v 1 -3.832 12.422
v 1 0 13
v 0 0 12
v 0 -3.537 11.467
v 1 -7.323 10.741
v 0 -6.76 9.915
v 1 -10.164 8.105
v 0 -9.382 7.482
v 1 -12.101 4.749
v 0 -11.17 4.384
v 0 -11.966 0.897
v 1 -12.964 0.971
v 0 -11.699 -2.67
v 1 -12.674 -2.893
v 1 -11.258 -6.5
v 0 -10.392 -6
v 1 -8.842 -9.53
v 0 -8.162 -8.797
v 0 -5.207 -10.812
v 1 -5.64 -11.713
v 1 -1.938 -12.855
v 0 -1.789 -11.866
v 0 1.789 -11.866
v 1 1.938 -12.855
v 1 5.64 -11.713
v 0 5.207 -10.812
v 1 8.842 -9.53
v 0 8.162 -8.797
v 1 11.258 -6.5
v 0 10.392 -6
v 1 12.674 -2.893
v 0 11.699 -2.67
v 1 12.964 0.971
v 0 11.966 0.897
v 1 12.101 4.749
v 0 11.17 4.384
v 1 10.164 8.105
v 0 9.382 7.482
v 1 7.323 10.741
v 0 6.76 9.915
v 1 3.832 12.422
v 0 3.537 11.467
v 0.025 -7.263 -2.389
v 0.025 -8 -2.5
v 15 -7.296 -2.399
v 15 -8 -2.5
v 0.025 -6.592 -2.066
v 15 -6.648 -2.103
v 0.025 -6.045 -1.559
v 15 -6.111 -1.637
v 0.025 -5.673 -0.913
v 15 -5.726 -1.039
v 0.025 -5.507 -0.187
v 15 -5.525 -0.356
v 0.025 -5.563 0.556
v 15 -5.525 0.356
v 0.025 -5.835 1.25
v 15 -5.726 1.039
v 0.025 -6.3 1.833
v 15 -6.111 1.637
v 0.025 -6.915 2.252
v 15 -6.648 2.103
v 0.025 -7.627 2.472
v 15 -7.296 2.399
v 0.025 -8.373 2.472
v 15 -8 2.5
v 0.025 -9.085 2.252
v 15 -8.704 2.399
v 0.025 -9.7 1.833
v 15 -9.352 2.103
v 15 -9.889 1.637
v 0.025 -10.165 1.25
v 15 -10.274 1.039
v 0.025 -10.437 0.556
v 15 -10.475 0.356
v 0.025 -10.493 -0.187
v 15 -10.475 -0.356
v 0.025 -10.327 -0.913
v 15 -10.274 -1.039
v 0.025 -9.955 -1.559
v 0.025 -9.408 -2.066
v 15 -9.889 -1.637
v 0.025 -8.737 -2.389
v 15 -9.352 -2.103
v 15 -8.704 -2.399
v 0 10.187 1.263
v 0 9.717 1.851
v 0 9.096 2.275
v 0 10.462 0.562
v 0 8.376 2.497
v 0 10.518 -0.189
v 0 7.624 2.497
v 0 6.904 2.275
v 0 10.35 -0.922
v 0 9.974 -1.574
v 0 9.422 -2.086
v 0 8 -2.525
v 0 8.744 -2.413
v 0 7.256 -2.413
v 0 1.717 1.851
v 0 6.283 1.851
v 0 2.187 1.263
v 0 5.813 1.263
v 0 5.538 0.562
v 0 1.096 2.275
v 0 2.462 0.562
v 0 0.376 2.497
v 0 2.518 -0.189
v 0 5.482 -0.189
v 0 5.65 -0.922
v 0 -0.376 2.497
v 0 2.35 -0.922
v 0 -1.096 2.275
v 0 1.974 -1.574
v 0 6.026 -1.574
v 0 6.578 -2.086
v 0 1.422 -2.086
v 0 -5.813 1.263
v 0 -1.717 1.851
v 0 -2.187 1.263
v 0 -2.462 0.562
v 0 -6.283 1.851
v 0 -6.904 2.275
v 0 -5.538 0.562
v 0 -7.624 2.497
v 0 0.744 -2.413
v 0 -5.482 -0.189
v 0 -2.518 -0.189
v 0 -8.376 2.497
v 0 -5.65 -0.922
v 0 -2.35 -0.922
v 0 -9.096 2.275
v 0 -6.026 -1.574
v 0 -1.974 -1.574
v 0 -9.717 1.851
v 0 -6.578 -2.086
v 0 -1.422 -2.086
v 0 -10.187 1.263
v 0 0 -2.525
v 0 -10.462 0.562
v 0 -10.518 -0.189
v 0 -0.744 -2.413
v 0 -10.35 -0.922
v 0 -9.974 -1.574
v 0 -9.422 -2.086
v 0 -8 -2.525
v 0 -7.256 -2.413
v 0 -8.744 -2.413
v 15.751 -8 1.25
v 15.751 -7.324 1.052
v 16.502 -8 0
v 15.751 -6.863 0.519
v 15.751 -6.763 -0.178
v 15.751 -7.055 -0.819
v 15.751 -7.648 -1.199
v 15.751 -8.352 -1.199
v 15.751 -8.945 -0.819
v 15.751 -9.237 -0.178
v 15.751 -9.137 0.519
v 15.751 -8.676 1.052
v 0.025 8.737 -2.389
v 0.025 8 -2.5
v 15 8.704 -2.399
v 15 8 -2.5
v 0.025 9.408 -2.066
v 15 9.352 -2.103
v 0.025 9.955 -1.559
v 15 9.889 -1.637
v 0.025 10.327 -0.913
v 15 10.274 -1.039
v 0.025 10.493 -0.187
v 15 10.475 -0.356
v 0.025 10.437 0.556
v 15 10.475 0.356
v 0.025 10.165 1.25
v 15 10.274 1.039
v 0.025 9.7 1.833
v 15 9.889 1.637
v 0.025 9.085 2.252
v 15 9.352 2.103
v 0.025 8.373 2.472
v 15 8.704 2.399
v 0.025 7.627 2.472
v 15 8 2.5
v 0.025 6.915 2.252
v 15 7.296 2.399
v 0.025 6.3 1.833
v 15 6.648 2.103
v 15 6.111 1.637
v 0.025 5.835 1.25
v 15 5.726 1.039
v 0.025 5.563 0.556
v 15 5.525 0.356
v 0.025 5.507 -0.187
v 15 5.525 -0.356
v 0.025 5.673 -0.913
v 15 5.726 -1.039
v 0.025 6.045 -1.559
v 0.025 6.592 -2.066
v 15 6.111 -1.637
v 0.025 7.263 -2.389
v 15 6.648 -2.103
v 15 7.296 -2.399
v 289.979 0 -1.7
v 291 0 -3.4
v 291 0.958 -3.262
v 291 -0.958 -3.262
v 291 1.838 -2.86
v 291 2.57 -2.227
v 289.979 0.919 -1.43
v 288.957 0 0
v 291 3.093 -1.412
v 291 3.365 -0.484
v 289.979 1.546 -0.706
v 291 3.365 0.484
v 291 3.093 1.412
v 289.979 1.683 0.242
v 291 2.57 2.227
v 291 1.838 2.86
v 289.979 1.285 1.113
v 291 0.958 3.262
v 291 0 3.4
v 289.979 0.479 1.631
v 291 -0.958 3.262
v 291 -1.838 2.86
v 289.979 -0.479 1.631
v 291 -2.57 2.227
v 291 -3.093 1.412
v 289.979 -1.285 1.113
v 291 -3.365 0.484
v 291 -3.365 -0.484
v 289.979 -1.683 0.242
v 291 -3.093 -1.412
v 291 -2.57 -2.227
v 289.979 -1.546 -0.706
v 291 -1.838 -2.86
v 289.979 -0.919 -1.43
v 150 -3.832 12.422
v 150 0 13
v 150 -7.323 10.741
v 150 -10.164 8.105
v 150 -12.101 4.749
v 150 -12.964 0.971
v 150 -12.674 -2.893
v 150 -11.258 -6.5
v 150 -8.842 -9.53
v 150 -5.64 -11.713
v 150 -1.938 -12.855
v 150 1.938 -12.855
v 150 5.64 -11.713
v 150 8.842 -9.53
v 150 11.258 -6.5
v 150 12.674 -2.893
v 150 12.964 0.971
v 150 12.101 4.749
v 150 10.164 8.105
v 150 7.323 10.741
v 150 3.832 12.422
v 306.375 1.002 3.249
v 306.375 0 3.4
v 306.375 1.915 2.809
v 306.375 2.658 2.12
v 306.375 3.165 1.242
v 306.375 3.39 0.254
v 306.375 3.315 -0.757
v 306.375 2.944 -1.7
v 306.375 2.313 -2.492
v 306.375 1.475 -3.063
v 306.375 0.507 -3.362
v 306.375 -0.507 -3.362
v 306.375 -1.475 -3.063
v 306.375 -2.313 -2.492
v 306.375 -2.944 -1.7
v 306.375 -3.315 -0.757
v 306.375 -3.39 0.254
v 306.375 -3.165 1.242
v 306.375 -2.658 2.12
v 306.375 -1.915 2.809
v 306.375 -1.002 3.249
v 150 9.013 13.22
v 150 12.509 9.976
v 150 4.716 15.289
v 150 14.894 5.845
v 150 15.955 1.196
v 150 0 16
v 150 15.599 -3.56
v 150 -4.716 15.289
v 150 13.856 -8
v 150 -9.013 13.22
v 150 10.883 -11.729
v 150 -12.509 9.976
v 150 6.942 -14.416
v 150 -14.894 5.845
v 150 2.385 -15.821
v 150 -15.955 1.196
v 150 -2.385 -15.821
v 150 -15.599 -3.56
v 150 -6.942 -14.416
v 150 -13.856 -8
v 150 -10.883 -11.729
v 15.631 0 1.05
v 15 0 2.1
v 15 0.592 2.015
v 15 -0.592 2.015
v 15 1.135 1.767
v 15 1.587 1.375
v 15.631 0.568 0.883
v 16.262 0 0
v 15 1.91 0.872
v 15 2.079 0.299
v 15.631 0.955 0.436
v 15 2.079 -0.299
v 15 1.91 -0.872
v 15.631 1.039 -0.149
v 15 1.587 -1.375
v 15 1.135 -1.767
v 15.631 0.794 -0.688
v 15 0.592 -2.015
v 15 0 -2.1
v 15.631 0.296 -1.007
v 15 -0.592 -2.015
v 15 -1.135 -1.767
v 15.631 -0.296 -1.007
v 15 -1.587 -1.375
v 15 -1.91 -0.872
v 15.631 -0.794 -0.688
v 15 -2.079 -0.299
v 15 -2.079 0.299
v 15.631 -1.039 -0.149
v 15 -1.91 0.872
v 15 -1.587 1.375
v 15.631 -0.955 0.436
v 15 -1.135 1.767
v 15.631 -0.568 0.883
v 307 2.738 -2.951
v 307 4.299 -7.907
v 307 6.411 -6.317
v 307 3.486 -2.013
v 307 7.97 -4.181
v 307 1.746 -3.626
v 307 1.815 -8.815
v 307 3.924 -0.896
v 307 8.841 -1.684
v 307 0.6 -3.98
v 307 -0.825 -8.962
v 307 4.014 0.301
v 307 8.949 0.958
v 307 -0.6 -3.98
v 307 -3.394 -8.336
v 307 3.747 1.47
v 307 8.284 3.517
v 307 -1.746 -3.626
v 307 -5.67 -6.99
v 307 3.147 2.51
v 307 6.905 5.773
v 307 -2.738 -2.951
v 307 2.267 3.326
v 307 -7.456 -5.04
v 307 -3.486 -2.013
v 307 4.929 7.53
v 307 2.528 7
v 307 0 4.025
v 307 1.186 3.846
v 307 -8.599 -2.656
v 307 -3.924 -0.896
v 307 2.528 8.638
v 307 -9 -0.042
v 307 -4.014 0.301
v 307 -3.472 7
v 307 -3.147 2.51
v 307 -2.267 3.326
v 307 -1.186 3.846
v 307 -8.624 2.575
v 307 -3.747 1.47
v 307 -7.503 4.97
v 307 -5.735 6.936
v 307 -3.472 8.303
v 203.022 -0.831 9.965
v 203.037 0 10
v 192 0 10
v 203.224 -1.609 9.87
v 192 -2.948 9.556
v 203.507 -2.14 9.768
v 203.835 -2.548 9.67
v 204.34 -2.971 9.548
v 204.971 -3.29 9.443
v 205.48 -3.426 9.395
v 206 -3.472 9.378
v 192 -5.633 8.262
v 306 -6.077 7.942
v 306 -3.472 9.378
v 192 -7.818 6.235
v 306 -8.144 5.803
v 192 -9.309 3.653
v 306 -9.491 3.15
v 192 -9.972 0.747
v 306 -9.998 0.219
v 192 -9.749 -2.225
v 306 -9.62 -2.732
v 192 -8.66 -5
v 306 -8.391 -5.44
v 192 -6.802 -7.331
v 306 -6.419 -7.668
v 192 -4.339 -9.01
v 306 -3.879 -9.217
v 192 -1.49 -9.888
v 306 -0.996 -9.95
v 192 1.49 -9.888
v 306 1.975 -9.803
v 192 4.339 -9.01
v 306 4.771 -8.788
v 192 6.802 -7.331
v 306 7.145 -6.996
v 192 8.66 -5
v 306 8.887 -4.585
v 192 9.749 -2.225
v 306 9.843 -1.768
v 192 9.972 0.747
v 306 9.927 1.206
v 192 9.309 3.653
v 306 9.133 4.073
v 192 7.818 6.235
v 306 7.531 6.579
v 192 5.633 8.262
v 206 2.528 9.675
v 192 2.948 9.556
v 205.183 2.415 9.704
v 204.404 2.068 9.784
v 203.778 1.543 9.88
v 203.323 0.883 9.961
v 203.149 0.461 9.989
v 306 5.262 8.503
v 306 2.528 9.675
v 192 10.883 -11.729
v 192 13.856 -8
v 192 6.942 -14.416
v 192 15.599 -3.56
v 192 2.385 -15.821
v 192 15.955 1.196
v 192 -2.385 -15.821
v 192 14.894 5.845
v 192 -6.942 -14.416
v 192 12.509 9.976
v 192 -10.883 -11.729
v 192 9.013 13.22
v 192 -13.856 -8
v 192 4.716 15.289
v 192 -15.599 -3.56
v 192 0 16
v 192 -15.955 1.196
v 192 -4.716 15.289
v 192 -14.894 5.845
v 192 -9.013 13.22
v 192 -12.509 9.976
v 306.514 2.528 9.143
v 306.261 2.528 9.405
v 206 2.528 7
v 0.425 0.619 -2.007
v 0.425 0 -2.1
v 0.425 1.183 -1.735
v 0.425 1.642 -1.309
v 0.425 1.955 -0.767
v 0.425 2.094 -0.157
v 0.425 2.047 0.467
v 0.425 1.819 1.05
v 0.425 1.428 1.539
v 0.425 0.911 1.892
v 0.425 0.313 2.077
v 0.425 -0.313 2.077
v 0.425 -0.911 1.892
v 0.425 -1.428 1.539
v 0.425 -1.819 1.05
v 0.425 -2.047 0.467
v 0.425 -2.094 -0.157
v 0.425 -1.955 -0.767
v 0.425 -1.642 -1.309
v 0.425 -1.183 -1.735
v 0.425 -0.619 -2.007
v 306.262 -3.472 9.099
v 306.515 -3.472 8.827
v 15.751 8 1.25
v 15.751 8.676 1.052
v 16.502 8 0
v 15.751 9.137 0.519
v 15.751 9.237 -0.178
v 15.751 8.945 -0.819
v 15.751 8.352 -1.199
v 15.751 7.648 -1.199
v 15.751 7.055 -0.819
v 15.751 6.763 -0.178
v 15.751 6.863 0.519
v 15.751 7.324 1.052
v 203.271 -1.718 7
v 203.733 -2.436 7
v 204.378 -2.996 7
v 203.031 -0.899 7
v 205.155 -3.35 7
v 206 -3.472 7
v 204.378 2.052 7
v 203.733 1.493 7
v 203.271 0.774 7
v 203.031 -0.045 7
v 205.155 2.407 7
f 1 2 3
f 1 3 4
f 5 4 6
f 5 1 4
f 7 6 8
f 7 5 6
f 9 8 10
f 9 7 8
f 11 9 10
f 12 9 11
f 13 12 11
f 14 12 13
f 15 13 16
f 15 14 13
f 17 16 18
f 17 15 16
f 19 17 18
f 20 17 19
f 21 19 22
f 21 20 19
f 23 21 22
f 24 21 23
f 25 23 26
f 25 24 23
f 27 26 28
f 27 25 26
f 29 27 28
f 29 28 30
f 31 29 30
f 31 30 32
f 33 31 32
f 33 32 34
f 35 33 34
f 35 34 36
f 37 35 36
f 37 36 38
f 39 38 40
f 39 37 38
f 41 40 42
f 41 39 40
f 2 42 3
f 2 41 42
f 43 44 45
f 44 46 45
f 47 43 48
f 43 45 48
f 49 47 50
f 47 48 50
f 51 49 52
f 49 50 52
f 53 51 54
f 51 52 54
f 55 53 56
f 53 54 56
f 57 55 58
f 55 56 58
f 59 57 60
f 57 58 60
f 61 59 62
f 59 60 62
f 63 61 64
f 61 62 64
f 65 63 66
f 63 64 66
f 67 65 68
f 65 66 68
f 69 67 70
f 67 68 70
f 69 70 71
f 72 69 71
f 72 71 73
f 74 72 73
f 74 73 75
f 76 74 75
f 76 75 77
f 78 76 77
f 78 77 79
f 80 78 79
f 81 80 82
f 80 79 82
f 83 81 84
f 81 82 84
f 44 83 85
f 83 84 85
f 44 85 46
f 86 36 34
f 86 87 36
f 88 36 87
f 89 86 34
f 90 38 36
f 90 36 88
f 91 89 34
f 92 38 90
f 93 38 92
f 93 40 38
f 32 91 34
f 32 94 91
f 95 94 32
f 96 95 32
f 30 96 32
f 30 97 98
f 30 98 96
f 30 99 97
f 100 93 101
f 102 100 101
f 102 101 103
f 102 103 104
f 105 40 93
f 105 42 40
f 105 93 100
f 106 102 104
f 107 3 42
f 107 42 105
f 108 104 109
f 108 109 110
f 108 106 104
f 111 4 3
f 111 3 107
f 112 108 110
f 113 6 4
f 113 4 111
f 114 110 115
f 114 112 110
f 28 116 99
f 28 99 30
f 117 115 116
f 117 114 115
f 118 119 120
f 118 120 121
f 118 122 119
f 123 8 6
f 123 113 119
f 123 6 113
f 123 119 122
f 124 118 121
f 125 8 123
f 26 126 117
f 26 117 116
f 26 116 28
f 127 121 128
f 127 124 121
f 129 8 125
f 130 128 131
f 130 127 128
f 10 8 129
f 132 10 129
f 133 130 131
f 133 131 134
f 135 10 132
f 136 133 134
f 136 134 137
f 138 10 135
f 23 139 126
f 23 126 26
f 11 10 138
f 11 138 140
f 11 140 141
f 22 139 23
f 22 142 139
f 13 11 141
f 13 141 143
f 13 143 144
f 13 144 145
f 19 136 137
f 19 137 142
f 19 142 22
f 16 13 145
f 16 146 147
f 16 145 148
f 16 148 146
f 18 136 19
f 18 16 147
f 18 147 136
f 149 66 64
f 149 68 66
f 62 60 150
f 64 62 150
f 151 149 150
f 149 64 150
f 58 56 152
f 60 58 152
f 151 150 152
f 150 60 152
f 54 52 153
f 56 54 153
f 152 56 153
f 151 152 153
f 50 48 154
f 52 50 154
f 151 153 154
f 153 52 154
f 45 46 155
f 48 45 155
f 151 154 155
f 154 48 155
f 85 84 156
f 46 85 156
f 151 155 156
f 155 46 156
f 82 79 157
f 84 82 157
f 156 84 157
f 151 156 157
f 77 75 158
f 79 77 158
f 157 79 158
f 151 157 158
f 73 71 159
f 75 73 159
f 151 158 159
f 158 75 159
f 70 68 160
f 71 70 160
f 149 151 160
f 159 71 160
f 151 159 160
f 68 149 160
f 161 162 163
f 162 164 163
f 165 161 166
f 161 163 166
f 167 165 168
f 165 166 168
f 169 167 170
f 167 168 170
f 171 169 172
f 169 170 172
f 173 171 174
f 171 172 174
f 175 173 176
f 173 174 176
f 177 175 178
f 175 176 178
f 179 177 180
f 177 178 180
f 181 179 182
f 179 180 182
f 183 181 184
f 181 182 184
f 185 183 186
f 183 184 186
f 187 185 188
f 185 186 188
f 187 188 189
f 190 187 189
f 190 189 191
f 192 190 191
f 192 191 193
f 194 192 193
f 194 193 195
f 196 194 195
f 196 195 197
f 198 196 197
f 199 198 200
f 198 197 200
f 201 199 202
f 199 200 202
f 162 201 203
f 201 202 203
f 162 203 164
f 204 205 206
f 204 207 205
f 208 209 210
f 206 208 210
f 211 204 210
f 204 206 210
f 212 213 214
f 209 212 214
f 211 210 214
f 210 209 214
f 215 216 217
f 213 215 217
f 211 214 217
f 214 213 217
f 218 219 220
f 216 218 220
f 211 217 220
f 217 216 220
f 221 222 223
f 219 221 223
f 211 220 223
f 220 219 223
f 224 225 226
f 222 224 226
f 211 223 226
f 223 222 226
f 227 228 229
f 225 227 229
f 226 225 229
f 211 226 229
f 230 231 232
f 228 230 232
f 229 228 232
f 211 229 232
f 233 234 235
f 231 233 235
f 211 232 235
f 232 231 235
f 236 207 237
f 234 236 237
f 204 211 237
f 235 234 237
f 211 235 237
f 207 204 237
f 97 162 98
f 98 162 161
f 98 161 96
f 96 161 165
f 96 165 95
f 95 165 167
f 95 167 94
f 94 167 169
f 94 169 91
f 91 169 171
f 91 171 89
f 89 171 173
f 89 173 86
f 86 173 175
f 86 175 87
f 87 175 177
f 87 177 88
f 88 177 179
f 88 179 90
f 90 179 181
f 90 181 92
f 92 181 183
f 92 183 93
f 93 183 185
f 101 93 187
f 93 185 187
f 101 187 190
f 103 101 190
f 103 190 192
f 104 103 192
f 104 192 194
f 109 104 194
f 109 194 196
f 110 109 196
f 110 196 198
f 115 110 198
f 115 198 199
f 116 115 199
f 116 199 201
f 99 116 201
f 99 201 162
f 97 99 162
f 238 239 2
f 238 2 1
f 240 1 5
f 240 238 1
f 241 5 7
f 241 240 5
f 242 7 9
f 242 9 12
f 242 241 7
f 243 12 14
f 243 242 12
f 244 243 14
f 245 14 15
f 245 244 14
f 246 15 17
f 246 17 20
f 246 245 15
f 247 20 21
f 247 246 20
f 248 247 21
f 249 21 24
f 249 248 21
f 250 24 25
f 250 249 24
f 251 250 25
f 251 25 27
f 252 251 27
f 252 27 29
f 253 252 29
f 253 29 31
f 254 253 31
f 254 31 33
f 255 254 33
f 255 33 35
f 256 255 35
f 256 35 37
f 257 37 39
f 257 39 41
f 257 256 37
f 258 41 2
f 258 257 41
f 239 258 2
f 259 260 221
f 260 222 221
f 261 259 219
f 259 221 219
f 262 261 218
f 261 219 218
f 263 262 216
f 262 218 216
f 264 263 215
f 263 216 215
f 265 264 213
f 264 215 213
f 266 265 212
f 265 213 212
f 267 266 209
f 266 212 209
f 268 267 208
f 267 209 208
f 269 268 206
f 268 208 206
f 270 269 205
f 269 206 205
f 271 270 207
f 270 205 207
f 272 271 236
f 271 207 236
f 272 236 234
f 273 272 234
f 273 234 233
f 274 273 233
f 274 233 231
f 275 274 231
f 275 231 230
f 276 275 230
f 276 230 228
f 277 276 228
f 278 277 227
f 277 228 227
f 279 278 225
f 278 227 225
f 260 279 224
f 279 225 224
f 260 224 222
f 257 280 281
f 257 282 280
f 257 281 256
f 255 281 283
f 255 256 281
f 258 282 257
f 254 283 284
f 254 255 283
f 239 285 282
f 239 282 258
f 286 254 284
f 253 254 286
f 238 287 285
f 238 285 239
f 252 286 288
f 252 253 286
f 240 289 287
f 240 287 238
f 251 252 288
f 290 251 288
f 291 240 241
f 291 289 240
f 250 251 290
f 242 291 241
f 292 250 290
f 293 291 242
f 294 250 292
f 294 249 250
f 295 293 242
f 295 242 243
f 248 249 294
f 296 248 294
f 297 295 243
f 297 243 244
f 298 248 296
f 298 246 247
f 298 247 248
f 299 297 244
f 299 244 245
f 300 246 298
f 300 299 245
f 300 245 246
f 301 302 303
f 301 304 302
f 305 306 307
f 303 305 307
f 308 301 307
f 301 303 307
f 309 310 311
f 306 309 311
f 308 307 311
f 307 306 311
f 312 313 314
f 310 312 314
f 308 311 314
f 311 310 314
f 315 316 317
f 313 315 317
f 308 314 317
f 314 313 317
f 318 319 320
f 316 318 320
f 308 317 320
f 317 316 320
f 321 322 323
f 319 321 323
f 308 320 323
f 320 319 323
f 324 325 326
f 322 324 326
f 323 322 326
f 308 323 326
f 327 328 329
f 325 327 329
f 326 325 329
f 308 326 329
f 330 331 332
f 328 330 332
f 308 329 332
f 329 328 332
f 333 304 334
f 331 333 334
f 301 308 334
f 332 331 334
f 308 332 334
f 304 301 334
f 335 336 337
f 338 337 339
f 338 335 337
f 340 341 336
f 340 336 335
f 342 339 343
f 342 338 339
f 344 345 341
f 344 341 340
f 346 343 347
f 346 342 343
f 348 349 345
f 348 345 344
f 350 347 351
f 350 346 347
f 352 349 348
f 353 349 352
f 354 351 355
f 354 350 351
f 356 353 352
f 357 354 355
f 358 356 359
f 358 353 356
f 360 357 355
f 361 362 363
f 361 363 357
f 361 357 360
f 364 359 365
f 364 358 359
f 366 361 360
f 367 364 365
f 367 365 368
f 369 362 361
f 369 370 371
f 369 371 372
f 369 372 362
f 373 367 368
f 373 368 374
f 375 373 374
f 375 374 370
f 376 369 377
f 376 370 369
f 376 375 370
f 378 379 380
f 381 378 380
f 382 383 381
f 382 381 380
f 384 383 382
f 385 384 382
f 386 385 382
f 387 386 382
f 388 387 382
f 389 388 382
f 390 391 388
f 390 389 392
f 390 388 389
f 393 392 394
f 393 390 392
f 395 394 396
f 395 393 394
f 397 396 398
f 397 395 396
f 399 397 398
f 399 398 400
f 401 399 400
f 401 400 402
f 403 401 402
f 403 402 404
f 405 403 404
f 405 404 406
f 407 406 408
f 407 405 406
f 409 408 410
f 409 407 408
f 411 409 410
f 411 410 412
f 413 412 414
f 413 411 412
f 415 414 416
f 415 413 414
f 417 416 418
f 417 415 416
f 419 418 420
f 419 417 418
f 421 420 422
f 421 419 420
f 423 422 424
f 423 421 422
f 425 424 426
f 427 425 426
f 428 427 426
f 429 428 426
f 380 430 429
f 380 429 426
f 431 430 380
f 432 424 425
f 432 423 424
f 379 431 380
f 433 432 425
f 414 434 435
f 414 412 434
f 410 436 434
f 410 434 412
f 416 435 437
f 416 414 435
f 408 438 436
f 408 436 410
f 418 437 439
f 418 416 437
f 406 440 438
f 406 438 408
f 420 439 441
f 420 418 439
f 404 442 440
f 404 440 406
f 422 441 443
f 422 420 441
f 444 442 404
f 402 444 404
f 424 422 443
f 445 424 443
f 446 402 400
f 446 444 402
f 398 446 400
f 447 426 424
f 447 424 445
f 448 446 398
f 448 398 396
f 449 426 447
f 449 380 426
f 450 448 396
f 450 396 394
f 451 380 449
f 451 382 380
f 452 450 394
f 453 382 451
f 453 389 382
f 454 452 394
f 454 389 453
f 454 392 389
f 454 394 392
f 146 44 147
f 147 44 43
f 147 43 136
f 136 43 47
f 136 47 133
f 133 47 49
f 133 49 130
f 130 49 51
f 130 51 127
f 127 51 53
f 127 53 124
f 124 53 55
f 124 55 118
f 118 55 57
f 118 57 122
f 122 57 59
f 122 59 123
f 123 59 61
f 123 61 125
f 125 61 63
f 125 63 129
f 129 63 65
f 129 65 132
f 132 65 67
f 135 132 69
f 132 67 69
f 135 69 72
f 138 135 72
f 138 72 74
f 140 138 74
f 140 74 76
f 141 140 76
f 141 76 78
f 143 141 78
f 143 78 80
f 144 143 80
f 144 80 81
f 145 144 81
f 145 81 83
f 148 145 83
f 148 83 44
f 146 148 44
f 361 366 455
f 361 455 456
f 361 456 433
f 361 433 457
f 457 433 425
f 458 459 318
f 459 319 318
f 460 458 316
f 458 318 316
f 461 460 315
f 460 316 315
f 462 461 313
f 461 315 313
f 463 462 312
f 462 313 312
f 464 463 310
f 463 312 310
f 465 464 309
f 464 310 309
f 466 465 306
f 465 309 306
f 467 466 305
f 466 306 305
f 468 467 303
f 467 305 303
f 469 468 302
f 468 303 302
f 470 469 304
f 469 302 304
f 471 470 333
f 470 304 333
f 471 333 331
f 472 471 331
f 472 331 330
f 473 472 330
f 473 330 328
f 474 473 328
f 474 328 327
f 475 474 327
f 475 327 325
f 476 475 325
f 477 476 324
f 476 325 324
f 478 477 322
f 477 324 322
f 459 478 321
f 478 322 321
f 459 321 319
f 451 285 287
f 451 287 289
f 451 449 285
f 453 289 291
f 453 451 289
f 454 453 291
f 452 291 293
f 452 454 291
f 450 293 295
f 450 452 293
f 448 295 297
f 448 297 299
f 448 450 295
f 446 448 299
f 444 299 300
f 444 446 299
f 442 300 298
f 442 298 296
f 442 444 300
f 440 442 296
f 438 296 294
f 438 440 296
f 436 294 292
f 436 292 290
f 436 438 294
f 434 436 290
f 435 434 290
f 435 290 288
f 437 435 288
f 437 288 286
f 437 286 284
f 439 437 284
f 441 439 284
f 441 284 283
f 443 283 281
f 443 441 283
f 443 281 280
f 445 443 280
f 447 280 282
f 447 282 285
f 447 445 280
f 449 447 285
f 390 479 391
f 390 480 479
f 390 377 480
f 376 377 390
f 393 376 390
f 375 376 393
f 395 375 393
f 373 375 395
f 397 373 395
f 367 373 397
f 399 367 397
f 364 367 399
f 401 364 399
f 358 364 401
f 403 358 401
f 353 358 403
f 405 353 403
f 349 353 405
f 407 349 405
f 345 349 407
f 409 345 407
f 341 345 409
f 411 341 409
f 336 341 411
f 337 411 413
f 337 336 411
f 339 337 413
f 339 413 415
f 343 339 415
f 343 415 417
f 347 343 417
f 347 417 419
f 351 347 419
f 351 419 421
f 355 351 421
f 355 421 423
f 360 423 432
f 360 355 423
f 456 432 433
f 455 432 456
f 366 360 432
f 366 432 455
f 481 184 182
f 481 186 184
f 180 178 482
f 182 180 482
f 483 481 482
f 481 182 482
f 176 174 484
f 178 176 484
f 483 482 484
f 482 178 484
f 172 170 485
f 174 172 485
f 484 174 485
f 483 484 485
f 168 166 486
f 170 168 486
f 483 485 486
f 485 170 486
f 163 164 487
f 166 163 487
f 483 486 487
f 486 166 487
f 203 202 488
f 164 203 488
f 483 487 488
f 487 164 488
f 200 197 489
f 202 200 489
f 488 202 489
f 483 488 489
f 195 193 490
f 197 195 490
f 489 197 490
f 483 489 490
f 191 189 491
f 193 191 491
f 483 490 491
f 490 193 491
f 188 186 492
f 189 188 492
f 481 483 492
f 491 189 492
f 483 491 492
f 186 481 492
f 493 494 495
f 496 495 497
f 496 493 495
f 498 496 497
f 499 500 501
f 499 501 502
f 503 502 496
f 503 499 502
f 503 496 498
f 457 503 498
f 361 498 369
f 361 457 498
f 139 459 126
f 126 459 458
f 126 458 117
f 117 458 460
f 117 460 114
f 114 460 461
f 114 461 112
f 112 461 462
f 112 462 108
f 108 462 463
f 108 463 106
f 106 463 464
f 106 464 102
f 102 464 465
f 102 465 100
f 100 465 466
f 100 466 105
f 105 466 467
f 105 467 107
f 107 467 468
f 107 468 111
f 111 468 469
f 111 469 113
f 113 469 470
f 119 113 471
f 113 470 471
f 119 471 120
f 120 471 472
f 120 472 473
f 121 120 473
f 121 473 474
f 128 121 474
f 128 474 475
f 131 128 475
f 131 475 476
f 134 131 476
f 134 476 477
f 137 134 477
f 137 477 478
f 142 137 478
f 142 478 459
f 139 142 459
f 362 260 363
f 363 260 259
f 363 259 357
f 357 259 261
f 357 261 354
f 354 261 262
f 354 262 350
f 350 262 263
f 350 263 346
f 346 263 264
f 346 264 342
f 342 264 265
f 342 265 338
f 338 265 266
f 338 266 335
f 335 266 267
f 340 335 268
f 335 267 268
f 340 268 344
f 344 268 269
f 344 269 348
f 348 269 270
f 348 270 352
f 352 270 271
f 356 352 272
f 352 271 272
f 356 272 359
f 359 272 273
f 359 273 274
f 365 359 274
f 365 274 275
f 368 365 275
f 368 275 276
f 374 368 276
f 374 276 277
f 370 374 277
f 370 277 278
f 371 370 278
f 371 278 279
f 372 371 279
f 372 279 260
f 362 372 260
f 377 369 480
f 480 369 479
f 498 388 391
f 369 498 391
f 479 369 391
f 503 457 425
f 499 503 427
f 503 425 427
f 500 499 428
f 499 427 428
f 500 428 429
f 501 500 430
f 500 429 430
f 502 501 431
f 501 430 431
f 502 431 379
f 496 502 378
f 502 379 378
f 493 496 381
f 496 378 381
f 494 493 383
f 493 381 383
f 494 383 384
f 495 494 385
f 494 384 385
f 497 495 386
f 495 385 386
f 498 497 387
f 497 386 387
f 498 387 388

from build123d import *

# Parameters (mm, degrees)
F_5_0MM_DOWEL_HOLE1_D           = 5
F_5_0MM_DOWEL_HOLE1_DEPTH       = 15
F_5_0MM_DOWEL_HOLE1_CSINK_D     = 5.05
F_5_0MM_DOWEL_HOLE1_CSINK_ANGLE = 90
F_5_0MM_DOWEL_HOLE1_TIP         = 1.502151548
M5_TAPPED_HOLE1_D               = 4.2
M5_TAPPED_HOLE1_DEPTH           = 15
M5_TAPPED_HOLE1_CSINK_D         = 5.05
M5_TAPPED_HOLE1_CSINK_ANGLE     = 90
M5_TAPPED_HOLE1_TIP             = 1.2618073
CUT_EXTRUDE1_DEPTH              = 3
CHAMFER1_SIZE                   = 1
M8_TAPPED_HOLE1_D               = 6.8
M8_TAPPED_HOLE1_DEPTH           = 16
M8_TAPPED_HOLE1_CSINK_D         = 8.05
M8_TAPPED_HOLE1_CSINK_ANGLE     = 90
M8_TAPPED_HOLE1_TIP             = 2.042926105


with BuildPart() as part:
    # Sketch1 → Revolve1 (revolve)
    with BuildSketch(Plane.XY, mode=Mode.PRIVATE) as revolve1_sk:
        Polygon((0, 0), (0, 13), (150, 13), (150, 16), (192, 16), (192, 10), (307, 10), (307, 0), align=None)
    revolve(revolve1_sk.sketch.rotate(Axis((0, 0, 0), (1, 0, 0)), 90), axis=Axis((0, 0, 0), (1, 0, 0)))

    # Ø5.0mm Dowel Hole1
    with Locations(Plane.ZY):
        with Locations((0, 8), (0, -8)):
            CounterSinkHole(F_5_0MM_DOWEL_HOLE1_D / 2, F_5_0MM_DOWEL_HOLE1_CSINK_D / 2, depth=F_5_0MM_DOWEL_HOLE1_DEPTH, counter_sink_angle=F_5_0MM_DOWEL_HOLE1_CSINK_ANGLE)
            with Locations((0, 0, -(F_5_0MM_DOWEL_HOLE1_DEPTH + F_5_0MM_DOWEL_HOLE1_TIP / 2))):  # 118° drill point
                Cone(0, F_5_0MM_DOWEL_HOLE1_D / 2, F_5_0MM_DOWEL_HOLE1_TIP, mode=Mode.SUBTRACT)

    # M5 Tapped Hole1
    with Locations(Plane.ZY):
        with Locations((0, 0)):
            CounterSinkHole(M5_TAPPED_HOLE1_D / 2, M5_TAPPED_HOLE1_CSINK_D / 2, depth=M5_TAPPED_HOLE1_DEPTH, counter_sink_angle=M5_TAPPED_HOLE1_CSINK_ANGLE)
            with Locations((0, 0, -(M5_TAPPED_HOLE1_DEPTH + M5_TAPPED_HOLE1_TIP / 2))):  # 118° drill point
                Cone(0, M5_TAPPED_HOLE1_D / 2, M5_TAPPED_HOLE1_TIP, mode=Mode.SUBTRACT)

    # Sketch7 → Cut-Extrude1 (cut)
    with BuildSketch(Plane.XY.offset(10)):
        with BuildLine():
            Line((307, 2.528133731), (206, 2.528133731))
            ThreePointArc((206, 2.528133731), (203, -0.471866269), (206, -3.471866269))
            Line((206, -3.471866269), (307, -3.471866269))
            Line((307, -3.471866269), (307, 2.528133731))
        make_face()
    extrude(amount=-CUT_EXTRUDE1_DEPTH, mode=Mode.SUBTRACT)

    # Chamfer1
    chamfer1_edges = [part.edges().sort_by_distance(p)[0] for p in [
        (307, 0.494710277, -9.987755591),
        (0, 0, -13),
    ]]
    chamfer(chamfer1_edges, length=CHAMFER1_SIZE)

    # M8 Tapped Hole1
    with Locations(Plane(origin=(307, 0, 0), x_dir=(0, 0, -1), z_dir=(1, 0, 0))):
        with Locations((0, 0)):
            CounterSinkHole(M8_TAPPED_HOLE1_D / 2, M8_TAPPED_HOLE1_CSINK_D / 2, depth=M8_TAPPED_HOLE1_DEPTH, counter_sink_angle=M8_TAPPED_HOLE1_CSINK_ANGLE)
            with Locations((0, 0, -(M8_TAPPED_HOLE1_DEPTH + M8_TAPPED_HOLE1_TIP / 2))):  # 118° drill point
                Cone(0, M8_TAPPED_HOLE1_D / 2, M8_TAPPED_HOLE1_TIP, mode=Mode.SUBTRACT)


solid = part.part
